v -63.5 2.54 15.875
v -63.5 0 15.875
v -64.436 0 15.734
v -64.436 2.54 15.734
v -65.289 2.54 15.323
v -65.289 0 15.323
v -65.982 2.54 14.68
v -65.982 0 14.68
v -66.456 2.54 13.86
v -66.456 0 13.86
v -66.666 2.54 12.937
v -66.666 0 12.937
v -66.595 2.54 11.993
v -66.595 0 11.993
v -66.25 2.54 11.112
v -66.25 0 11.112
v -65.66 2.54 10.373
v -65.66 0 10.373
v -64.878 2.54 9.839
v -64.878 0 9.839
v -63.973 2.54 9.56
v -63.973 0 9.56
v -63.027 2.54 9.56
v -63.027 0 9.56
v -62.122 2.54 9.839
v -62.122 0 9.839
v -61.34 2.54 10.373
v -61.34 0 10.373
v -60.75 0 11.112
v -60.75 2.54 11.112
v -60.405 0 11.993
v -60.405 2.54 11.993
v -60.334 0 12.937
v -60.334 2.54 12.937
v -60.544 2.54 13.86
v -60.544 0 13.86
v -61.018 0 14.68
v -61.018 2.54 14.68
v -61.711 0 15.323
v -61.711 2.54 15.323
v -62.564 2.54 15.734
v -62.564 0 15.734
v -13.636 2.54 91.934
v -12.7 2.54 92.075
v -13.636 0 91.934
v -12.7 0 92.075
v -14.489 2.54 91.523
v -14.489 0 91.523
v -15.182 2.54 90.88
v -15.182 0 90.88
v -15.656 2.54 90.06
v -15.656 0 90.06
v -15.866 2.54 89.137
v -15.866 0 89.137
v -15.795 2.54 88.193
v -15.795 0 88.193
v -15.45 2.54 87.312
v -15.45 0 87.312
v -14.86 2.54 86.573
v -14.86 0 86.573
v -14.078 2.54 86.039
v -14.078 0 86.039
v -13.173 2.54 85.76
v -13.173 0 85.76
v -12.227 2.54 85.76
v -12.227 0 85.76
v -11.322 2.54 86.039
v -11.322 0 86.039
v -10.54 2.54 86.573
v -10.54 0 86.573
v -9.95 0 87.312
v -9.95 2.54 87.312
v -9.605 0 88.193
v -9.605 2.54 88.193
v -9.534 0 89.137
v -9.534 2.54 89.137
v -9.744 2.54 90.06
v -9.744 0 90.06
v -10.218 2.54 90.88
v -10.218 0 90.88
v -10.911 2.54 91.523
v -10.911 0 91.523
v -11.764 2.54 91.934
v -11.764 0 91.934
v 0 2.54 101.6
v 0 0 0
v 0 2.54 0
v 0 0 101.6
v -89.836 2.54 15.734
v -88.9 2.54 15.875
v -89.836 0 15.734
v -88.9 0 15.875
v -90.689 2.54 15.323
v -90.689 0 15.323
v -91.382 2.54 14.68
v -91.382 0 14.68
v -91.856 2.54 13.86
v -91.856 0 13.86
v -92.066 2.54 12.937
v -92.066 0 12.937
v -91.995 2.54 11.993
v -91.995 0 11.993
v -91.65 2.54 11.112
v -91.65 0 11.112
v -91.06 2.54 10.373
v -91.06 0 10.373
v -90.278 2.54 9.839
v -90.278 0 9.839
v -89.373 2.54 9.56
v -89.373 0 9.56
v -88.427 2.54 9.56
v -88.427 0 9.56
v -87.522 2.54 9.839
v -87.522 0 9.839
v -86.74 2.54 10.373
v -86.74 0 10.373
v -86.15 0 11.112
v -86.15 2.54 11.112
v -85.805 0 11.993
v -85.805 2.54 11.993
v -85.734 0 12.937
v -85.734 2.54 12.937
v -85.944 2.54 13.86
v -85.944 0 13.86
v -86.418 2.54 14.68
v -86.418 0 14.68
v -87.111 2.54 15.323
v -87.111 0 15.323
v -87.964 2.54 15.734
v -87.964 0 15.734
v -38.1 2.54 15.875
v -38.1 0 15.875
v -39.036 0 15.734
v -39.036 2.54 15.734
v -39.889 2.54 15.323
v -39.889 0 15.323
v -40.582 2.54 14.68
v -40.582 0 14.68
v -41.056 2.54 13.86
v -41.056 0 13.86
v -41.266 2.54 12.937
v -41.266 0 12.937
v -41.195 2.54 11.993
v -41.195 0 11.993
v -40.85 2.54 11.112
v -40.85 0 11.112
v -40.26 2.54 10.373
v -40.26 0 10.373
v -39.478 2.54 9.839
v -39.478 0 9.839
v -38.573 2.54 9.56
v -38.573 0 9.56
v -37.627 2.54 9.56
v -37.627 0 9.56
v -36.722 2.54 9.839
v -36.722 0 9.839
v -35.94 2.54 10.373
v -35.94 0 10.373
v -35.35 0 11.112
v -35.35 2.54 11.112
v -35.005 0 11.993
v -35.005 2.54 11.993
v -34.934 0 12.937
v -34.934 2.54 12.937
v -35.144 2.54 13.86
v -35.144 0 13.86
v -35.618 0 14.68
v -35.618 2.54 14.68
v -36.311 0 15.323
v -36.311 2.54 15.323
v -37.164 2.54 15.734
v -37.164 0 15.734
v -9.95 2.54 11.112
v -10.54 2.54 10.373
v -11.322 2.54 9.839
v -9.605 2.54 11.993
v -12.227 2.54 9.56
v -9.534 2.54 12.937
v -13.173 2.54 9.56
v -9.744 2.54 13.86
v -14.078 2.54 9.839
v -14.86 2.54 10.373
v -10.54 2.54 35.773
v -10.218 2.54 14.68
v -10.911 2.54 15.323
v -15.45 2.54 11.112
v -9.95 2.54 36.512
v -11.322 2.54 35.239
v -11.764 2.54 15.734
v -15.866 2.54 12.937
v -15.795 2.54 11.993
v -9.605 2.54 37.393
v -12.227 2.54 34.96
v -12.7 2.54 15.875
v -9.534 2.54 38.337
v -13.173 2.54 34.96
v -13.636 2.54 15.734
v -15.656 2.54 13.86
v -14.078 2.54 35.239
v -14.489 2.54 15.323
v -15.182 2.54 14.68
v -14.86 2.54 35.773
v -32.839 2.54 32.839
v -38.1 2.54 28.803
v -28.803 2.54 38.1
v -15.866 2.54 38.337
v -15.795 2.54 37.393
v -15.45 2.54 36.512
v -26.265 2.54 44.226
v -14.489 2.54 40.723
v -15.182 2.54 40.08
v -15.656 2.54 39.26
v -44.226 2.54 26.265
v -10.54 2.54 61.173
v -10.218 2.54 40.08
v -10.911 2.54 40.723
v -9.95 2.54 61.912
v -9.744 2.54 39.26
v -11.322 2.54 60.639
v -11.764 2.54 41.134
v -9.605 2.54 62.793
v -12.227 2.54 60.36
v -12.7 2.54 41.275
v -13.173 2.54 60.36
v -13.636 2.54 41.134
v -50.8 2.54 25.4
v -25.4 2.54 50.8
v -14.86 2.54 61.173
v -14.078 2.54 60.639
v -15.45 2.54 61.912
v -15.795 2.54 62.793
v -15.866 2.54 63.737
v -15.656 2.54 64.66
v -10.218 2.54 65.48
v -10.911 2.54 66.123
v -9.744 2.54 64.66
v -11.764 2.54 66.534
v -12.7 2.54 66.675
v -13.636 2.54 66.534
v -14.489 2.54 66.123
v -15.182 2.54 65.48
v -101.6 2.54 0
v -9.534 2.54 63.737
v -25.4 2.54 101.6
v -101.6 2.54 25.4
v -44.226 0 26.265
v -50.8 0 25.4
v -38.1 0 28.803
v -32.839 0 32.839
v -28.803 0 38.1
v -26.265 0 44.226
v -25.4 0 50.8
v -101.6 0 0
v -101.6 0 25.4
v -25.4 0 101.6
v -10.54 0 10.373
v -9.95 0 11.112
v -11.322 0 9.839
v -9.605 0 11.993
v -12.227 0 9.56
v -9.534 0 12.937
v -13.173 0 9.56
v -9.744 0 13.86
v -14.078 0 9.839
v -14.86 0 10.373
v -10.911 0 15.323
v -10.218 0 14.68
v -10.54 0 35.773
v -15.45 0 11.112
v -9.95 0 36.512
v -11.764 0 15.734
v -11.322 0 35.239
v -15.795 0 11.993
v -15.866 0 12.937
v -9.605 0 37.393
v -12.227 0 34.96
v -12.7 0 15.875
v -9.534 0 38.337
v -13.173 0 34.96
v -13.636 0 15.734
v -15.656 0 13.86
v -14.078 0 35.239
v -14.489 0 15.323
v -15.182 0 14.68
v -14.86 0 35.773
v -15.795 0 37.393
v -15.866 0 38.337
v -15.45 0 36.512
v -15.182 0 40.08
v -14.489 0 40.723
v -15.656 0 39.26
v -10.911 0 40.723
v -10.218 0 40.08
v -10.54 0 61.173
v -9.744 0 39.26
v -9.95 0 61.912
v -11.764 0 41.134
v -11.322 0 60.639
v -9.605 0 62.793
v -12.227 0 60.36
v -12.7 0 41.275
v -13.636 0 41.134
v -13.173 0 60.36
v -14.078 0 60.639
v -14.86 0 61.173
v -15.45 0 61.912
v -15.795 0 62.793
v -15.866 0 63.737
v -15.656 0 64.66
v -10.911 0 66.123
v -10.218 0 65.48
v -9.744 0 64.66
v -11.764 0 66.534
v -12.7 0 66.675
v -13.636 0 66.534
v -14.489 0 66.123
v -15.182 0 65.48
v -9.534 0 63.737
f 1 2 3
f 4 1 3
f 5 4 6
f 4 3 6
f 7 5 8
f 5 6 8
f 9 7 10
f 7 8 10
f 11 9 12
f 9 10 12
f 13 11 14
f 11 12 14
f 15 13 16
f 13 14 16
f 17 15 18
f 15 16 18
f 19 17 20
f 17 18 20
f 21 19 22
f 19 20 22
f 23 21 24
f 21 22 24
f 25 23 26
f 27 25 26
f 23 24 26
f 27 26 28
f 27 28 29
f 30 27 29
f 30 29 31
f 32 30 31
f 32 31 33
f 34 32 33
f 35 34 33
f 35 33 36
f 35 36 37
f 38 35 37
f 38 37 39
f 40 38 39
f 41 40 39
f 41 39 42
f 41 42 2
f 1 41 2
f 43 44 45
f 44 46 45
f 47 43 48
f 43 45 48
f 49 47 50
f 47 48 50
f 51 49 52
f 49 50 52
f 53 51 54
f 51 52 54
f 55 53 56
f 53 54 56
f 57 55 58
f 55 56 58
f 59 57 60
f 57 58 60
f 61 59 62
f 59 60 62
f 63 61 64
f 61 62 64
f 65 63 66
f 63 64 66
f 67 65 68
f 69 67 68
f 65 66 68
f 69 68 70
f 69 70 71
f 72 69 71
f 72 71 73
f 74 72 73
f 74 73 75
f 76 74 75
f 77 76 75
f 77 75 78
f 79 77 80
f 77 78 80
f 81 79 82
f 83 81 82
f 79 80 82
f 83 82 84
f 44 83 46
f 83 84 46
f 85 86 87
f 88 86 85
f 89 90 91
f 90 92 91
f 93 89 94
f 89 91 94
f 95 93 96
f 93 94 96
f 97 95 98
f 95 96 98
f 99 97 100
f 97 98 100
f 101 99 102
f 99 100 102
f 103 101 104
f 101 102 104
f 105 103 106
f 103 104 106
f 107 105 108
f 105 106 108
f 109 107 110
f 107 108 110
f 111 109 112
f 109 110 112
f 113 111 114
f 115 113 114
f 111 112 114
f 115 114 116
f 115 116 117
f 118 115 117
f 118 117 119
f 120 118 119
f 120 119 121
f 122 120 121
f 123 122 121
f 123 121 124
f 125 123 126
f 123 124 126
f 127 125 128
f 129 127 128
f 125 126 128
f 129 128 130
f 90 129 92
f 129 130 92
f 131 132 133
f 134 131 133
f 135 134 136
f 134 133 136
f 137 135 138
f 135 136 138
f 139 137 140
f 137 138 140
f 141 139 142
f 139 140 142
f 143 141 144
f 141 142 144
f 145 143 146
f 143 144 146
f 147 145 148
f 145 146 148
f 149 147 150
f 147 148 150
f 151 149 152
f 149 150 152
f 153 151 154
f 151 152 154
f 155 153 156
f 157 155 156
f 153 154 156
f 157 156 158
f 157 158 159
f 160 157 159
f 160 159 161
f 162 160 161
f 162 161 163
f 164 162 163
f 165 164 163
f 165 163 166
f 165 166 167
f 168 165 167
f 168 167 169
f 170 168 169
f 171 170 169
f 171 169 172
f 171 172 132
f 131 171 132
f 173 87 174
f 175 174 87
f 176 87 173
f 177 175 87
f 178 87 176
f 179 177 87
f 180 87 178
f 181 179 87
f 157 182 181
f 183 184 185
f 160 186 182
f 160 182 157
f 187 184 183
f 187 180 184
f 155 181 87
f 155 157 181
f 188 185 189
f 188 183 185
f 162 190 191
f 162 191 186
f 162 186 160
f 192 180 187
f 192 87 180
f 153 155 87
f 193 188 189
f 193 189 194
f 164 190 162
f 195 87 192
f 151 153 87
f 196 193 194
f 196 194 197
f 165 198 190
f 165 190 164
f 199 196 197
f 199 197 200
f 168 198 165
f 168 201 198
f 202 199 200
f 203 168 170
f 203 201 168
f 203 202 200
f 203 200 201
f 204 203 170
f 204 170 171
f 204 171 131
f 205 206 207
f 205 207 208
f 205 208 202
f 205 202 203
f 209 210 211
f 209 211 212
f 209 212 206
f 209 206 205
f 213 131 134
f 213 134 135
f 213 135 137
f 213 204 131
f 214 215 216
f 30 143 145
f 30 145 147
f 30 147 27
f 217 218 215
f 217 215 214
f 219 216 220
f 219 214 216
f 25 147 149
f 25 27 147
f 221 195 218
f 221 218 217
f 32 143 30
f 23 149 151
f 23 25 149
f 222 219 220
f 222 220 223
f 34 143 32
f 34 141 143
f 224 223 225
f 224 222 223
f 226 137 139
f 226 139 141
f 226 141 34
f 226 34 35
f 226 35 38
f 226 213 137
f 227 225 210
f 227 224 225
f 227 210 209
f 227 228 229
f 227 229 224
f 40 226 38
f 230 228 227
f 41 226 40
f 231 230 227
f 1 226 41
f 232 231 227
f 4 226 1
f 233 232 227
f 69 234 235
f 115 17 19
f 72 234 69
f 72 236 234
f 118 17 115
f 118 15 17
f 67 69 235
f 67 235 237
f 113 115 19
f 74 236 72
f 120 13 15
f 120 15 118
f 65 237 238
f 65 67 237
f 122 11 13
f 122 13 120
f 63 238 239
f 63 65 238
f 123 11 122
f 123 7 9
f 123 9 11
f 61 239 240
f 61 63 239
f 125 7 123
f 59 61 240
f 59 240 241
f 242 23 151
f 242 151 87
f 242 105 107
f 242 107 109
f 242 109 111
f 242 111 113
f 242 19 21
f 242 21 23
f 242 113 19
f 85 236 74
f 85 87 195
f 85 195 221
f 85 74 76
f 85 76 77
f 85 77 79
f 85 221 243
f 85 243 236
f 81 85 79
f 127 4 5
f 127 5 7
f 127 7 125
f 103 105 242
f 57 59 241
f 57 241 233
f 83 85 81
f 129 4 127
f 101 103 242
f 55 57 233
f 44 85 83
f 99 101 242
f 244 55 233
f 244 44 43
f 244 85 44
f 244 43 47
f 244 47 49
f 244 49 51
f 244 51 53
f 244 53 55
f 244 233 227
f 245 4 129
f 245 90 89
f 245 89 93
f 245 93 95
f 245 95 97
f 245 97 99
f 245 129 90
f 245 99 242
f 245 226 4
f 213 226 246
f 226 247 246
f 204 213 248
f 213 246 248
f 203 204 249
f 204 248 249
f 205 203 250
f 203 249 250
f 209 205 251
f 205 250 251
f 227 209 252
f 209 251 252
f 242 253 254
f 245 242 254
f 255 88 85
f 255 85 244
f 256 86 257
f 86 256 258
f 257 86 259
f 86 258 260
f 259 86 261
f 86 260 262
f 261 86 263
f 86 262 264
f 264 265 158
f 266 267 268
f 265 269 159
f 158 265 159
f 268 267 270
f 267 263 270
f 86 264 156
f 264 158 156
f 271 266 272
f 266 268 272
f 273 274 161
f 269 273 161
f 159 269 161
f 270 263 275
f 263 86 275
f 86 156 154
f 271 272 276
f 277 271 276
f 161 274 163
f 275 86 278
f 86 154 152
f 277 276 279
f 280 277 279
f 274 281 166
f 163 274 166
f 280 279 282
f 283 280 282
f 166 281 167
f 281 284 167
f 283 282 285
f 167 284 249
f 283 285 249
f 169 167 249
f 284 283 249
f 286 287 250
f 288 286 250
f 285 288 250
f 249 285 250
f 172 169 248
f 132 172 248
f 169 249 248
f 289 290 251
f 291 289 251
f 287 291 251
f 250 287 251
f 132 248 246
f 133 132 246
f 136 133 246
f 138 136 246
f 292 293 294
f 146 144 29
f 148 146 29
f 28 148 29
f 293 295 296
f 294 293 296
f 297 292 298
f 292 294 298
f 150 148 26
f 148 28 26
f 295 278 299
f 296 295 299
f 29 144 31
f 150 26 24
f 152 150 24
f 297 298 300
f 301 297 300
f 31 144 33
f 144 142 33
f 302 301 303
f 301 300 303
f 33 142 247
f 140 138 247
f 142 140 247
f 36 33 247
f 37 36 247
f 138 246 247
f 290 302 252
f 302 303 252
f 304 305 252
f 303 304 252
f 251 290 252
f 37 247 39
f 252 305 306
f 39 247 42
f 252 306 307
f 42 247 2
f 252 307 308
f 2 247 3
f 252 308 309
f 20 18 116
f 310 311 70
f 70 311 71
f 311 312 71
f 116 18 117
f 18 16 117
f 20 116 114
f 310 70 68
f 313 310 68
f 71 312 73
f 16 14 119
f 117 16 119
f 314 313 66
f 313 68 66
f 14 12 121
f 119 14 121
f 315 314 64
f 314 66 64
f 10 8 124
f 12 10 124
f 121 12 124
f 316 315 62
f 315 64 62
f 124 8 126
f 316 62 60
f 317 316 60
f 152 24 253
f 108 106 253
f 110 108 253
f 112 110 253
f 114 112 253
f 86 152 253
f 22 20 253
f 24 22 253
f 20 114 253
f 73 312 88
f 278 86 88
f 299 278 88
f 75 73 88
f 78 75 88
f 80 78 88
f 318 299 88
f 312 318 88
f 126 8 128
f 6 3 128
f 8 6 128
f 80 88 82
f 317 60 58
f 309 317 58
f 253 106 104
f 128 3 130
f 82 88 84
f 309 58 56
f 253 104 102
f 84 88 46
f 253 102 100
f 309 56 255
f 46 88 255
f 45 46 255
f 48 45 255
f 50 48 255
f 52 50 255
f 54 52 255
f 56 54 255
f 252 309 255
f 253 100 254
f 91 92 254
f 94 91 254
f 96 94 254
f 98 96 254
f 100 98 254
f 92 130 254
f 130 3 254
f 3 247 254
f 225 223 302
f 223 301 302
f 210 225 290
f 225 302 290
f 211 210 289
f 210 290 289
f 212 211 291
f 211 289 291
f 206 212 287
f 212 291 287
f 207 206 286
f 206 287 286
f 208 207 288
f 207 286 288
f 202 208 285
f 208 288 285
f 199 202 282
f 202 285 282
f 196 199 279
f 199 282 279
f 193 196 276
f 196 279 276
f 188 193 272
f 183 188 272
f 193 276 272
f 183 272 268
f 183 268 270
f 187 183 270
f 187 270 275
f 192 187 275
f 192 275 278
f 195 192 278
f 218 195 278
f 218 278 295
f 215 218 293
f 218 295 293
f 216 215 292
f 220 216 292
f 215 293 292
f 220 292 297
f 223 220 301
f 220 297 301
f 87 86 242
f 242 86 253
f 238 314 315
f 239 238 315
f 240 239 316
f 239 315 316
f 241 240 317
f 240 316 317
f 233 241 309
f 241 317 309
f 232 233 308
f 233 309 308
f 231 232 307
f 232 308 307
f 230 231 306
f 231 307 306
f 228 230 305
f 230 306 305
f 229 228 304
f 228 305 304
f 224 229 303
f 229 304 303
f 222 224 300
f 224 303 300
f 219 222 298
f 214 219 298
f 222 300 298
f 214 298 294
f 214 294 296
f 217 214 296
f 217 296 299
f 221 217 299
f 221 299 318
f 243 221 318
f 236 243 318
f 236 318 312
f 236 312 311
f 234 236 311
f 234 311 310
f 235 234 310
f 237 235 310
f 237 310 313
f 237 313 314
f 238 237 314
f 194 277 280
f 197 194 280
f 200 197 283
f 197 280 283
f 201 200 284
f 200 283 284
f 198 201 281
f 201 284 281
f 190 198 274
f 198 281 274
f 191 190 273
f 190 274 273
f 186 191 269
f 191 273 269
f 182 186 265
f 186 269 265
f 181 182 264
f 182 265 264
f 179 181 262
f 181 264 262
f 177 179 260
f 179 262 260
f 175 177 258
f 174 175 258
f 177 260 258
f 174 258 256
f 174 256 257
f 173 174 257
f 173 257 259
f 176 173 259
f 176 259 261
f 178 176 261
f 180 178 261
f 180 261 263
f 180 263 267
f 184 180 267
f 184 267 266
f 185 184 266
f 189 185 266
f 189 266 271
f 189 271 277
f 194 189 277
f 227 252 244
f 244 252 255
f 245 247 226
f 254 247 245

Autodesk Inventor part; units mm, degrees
ref_plane "YZ Plane" through (0, 0, 0) normal (1, 0, 0) x (0, 1, 0)
ref_plane "XZ Plane" through (0, 0, 0) normal (0, 1, 0) x (-1, 0, 0)
ref_plane "XY Plane" through (0, 0, 0) normal (0, 0, 1) x (1, 0, 0)
sketch "Sketch1" plane through (0, 0, 0) normal (0, 1, 0) x (-1, 0, 0)
  line L0 (0, 0) -> (0, 101.6)
  line L1 (0, 101.6) -> (25.4, 101.6)
  line L2 (0, 0) -> (101.6, 0)
  line L3 (101.6, 0) -> (101.6, 25.4)
  line L4 (50.8, 25.4) -> (101.6, 25.4)
  line L5 (25.4, 50.8) -> (25.4, 101.6)
  arc A0 (25.4, 28.575) -> (28.575, 25.4) centre (28.575, 28.575) ccw
  arc A1 (25.4, 50.8) -> (50.8, 25.4) centre (50.8, 50.8) ccw
  dimension "d0" = 101.6
  dimension "d1" = 25.4
  dimension "d2" = 101.6
  dimension "d3" = 25.4
  dimension "d4" = 3.175
  dimension "d5" = 25.4
extrude "Extrusion1" add sketch "Sketch1" along normal blind 2.54
hole "Hole1" at (-12.7, 2.54, 12.7) direction (0, -1, 0) diameter 6.35 end through all
pattern_linear "Rectangular Pattern1" count 4 spacing 25.4 along (-1, 0, 0) of "Hole1"
pattern_linear "Rectangular Pattern2" count 4 spacing 25.4 along (0, 0, 1) of "Hole1"
properties part number "Gusset"
